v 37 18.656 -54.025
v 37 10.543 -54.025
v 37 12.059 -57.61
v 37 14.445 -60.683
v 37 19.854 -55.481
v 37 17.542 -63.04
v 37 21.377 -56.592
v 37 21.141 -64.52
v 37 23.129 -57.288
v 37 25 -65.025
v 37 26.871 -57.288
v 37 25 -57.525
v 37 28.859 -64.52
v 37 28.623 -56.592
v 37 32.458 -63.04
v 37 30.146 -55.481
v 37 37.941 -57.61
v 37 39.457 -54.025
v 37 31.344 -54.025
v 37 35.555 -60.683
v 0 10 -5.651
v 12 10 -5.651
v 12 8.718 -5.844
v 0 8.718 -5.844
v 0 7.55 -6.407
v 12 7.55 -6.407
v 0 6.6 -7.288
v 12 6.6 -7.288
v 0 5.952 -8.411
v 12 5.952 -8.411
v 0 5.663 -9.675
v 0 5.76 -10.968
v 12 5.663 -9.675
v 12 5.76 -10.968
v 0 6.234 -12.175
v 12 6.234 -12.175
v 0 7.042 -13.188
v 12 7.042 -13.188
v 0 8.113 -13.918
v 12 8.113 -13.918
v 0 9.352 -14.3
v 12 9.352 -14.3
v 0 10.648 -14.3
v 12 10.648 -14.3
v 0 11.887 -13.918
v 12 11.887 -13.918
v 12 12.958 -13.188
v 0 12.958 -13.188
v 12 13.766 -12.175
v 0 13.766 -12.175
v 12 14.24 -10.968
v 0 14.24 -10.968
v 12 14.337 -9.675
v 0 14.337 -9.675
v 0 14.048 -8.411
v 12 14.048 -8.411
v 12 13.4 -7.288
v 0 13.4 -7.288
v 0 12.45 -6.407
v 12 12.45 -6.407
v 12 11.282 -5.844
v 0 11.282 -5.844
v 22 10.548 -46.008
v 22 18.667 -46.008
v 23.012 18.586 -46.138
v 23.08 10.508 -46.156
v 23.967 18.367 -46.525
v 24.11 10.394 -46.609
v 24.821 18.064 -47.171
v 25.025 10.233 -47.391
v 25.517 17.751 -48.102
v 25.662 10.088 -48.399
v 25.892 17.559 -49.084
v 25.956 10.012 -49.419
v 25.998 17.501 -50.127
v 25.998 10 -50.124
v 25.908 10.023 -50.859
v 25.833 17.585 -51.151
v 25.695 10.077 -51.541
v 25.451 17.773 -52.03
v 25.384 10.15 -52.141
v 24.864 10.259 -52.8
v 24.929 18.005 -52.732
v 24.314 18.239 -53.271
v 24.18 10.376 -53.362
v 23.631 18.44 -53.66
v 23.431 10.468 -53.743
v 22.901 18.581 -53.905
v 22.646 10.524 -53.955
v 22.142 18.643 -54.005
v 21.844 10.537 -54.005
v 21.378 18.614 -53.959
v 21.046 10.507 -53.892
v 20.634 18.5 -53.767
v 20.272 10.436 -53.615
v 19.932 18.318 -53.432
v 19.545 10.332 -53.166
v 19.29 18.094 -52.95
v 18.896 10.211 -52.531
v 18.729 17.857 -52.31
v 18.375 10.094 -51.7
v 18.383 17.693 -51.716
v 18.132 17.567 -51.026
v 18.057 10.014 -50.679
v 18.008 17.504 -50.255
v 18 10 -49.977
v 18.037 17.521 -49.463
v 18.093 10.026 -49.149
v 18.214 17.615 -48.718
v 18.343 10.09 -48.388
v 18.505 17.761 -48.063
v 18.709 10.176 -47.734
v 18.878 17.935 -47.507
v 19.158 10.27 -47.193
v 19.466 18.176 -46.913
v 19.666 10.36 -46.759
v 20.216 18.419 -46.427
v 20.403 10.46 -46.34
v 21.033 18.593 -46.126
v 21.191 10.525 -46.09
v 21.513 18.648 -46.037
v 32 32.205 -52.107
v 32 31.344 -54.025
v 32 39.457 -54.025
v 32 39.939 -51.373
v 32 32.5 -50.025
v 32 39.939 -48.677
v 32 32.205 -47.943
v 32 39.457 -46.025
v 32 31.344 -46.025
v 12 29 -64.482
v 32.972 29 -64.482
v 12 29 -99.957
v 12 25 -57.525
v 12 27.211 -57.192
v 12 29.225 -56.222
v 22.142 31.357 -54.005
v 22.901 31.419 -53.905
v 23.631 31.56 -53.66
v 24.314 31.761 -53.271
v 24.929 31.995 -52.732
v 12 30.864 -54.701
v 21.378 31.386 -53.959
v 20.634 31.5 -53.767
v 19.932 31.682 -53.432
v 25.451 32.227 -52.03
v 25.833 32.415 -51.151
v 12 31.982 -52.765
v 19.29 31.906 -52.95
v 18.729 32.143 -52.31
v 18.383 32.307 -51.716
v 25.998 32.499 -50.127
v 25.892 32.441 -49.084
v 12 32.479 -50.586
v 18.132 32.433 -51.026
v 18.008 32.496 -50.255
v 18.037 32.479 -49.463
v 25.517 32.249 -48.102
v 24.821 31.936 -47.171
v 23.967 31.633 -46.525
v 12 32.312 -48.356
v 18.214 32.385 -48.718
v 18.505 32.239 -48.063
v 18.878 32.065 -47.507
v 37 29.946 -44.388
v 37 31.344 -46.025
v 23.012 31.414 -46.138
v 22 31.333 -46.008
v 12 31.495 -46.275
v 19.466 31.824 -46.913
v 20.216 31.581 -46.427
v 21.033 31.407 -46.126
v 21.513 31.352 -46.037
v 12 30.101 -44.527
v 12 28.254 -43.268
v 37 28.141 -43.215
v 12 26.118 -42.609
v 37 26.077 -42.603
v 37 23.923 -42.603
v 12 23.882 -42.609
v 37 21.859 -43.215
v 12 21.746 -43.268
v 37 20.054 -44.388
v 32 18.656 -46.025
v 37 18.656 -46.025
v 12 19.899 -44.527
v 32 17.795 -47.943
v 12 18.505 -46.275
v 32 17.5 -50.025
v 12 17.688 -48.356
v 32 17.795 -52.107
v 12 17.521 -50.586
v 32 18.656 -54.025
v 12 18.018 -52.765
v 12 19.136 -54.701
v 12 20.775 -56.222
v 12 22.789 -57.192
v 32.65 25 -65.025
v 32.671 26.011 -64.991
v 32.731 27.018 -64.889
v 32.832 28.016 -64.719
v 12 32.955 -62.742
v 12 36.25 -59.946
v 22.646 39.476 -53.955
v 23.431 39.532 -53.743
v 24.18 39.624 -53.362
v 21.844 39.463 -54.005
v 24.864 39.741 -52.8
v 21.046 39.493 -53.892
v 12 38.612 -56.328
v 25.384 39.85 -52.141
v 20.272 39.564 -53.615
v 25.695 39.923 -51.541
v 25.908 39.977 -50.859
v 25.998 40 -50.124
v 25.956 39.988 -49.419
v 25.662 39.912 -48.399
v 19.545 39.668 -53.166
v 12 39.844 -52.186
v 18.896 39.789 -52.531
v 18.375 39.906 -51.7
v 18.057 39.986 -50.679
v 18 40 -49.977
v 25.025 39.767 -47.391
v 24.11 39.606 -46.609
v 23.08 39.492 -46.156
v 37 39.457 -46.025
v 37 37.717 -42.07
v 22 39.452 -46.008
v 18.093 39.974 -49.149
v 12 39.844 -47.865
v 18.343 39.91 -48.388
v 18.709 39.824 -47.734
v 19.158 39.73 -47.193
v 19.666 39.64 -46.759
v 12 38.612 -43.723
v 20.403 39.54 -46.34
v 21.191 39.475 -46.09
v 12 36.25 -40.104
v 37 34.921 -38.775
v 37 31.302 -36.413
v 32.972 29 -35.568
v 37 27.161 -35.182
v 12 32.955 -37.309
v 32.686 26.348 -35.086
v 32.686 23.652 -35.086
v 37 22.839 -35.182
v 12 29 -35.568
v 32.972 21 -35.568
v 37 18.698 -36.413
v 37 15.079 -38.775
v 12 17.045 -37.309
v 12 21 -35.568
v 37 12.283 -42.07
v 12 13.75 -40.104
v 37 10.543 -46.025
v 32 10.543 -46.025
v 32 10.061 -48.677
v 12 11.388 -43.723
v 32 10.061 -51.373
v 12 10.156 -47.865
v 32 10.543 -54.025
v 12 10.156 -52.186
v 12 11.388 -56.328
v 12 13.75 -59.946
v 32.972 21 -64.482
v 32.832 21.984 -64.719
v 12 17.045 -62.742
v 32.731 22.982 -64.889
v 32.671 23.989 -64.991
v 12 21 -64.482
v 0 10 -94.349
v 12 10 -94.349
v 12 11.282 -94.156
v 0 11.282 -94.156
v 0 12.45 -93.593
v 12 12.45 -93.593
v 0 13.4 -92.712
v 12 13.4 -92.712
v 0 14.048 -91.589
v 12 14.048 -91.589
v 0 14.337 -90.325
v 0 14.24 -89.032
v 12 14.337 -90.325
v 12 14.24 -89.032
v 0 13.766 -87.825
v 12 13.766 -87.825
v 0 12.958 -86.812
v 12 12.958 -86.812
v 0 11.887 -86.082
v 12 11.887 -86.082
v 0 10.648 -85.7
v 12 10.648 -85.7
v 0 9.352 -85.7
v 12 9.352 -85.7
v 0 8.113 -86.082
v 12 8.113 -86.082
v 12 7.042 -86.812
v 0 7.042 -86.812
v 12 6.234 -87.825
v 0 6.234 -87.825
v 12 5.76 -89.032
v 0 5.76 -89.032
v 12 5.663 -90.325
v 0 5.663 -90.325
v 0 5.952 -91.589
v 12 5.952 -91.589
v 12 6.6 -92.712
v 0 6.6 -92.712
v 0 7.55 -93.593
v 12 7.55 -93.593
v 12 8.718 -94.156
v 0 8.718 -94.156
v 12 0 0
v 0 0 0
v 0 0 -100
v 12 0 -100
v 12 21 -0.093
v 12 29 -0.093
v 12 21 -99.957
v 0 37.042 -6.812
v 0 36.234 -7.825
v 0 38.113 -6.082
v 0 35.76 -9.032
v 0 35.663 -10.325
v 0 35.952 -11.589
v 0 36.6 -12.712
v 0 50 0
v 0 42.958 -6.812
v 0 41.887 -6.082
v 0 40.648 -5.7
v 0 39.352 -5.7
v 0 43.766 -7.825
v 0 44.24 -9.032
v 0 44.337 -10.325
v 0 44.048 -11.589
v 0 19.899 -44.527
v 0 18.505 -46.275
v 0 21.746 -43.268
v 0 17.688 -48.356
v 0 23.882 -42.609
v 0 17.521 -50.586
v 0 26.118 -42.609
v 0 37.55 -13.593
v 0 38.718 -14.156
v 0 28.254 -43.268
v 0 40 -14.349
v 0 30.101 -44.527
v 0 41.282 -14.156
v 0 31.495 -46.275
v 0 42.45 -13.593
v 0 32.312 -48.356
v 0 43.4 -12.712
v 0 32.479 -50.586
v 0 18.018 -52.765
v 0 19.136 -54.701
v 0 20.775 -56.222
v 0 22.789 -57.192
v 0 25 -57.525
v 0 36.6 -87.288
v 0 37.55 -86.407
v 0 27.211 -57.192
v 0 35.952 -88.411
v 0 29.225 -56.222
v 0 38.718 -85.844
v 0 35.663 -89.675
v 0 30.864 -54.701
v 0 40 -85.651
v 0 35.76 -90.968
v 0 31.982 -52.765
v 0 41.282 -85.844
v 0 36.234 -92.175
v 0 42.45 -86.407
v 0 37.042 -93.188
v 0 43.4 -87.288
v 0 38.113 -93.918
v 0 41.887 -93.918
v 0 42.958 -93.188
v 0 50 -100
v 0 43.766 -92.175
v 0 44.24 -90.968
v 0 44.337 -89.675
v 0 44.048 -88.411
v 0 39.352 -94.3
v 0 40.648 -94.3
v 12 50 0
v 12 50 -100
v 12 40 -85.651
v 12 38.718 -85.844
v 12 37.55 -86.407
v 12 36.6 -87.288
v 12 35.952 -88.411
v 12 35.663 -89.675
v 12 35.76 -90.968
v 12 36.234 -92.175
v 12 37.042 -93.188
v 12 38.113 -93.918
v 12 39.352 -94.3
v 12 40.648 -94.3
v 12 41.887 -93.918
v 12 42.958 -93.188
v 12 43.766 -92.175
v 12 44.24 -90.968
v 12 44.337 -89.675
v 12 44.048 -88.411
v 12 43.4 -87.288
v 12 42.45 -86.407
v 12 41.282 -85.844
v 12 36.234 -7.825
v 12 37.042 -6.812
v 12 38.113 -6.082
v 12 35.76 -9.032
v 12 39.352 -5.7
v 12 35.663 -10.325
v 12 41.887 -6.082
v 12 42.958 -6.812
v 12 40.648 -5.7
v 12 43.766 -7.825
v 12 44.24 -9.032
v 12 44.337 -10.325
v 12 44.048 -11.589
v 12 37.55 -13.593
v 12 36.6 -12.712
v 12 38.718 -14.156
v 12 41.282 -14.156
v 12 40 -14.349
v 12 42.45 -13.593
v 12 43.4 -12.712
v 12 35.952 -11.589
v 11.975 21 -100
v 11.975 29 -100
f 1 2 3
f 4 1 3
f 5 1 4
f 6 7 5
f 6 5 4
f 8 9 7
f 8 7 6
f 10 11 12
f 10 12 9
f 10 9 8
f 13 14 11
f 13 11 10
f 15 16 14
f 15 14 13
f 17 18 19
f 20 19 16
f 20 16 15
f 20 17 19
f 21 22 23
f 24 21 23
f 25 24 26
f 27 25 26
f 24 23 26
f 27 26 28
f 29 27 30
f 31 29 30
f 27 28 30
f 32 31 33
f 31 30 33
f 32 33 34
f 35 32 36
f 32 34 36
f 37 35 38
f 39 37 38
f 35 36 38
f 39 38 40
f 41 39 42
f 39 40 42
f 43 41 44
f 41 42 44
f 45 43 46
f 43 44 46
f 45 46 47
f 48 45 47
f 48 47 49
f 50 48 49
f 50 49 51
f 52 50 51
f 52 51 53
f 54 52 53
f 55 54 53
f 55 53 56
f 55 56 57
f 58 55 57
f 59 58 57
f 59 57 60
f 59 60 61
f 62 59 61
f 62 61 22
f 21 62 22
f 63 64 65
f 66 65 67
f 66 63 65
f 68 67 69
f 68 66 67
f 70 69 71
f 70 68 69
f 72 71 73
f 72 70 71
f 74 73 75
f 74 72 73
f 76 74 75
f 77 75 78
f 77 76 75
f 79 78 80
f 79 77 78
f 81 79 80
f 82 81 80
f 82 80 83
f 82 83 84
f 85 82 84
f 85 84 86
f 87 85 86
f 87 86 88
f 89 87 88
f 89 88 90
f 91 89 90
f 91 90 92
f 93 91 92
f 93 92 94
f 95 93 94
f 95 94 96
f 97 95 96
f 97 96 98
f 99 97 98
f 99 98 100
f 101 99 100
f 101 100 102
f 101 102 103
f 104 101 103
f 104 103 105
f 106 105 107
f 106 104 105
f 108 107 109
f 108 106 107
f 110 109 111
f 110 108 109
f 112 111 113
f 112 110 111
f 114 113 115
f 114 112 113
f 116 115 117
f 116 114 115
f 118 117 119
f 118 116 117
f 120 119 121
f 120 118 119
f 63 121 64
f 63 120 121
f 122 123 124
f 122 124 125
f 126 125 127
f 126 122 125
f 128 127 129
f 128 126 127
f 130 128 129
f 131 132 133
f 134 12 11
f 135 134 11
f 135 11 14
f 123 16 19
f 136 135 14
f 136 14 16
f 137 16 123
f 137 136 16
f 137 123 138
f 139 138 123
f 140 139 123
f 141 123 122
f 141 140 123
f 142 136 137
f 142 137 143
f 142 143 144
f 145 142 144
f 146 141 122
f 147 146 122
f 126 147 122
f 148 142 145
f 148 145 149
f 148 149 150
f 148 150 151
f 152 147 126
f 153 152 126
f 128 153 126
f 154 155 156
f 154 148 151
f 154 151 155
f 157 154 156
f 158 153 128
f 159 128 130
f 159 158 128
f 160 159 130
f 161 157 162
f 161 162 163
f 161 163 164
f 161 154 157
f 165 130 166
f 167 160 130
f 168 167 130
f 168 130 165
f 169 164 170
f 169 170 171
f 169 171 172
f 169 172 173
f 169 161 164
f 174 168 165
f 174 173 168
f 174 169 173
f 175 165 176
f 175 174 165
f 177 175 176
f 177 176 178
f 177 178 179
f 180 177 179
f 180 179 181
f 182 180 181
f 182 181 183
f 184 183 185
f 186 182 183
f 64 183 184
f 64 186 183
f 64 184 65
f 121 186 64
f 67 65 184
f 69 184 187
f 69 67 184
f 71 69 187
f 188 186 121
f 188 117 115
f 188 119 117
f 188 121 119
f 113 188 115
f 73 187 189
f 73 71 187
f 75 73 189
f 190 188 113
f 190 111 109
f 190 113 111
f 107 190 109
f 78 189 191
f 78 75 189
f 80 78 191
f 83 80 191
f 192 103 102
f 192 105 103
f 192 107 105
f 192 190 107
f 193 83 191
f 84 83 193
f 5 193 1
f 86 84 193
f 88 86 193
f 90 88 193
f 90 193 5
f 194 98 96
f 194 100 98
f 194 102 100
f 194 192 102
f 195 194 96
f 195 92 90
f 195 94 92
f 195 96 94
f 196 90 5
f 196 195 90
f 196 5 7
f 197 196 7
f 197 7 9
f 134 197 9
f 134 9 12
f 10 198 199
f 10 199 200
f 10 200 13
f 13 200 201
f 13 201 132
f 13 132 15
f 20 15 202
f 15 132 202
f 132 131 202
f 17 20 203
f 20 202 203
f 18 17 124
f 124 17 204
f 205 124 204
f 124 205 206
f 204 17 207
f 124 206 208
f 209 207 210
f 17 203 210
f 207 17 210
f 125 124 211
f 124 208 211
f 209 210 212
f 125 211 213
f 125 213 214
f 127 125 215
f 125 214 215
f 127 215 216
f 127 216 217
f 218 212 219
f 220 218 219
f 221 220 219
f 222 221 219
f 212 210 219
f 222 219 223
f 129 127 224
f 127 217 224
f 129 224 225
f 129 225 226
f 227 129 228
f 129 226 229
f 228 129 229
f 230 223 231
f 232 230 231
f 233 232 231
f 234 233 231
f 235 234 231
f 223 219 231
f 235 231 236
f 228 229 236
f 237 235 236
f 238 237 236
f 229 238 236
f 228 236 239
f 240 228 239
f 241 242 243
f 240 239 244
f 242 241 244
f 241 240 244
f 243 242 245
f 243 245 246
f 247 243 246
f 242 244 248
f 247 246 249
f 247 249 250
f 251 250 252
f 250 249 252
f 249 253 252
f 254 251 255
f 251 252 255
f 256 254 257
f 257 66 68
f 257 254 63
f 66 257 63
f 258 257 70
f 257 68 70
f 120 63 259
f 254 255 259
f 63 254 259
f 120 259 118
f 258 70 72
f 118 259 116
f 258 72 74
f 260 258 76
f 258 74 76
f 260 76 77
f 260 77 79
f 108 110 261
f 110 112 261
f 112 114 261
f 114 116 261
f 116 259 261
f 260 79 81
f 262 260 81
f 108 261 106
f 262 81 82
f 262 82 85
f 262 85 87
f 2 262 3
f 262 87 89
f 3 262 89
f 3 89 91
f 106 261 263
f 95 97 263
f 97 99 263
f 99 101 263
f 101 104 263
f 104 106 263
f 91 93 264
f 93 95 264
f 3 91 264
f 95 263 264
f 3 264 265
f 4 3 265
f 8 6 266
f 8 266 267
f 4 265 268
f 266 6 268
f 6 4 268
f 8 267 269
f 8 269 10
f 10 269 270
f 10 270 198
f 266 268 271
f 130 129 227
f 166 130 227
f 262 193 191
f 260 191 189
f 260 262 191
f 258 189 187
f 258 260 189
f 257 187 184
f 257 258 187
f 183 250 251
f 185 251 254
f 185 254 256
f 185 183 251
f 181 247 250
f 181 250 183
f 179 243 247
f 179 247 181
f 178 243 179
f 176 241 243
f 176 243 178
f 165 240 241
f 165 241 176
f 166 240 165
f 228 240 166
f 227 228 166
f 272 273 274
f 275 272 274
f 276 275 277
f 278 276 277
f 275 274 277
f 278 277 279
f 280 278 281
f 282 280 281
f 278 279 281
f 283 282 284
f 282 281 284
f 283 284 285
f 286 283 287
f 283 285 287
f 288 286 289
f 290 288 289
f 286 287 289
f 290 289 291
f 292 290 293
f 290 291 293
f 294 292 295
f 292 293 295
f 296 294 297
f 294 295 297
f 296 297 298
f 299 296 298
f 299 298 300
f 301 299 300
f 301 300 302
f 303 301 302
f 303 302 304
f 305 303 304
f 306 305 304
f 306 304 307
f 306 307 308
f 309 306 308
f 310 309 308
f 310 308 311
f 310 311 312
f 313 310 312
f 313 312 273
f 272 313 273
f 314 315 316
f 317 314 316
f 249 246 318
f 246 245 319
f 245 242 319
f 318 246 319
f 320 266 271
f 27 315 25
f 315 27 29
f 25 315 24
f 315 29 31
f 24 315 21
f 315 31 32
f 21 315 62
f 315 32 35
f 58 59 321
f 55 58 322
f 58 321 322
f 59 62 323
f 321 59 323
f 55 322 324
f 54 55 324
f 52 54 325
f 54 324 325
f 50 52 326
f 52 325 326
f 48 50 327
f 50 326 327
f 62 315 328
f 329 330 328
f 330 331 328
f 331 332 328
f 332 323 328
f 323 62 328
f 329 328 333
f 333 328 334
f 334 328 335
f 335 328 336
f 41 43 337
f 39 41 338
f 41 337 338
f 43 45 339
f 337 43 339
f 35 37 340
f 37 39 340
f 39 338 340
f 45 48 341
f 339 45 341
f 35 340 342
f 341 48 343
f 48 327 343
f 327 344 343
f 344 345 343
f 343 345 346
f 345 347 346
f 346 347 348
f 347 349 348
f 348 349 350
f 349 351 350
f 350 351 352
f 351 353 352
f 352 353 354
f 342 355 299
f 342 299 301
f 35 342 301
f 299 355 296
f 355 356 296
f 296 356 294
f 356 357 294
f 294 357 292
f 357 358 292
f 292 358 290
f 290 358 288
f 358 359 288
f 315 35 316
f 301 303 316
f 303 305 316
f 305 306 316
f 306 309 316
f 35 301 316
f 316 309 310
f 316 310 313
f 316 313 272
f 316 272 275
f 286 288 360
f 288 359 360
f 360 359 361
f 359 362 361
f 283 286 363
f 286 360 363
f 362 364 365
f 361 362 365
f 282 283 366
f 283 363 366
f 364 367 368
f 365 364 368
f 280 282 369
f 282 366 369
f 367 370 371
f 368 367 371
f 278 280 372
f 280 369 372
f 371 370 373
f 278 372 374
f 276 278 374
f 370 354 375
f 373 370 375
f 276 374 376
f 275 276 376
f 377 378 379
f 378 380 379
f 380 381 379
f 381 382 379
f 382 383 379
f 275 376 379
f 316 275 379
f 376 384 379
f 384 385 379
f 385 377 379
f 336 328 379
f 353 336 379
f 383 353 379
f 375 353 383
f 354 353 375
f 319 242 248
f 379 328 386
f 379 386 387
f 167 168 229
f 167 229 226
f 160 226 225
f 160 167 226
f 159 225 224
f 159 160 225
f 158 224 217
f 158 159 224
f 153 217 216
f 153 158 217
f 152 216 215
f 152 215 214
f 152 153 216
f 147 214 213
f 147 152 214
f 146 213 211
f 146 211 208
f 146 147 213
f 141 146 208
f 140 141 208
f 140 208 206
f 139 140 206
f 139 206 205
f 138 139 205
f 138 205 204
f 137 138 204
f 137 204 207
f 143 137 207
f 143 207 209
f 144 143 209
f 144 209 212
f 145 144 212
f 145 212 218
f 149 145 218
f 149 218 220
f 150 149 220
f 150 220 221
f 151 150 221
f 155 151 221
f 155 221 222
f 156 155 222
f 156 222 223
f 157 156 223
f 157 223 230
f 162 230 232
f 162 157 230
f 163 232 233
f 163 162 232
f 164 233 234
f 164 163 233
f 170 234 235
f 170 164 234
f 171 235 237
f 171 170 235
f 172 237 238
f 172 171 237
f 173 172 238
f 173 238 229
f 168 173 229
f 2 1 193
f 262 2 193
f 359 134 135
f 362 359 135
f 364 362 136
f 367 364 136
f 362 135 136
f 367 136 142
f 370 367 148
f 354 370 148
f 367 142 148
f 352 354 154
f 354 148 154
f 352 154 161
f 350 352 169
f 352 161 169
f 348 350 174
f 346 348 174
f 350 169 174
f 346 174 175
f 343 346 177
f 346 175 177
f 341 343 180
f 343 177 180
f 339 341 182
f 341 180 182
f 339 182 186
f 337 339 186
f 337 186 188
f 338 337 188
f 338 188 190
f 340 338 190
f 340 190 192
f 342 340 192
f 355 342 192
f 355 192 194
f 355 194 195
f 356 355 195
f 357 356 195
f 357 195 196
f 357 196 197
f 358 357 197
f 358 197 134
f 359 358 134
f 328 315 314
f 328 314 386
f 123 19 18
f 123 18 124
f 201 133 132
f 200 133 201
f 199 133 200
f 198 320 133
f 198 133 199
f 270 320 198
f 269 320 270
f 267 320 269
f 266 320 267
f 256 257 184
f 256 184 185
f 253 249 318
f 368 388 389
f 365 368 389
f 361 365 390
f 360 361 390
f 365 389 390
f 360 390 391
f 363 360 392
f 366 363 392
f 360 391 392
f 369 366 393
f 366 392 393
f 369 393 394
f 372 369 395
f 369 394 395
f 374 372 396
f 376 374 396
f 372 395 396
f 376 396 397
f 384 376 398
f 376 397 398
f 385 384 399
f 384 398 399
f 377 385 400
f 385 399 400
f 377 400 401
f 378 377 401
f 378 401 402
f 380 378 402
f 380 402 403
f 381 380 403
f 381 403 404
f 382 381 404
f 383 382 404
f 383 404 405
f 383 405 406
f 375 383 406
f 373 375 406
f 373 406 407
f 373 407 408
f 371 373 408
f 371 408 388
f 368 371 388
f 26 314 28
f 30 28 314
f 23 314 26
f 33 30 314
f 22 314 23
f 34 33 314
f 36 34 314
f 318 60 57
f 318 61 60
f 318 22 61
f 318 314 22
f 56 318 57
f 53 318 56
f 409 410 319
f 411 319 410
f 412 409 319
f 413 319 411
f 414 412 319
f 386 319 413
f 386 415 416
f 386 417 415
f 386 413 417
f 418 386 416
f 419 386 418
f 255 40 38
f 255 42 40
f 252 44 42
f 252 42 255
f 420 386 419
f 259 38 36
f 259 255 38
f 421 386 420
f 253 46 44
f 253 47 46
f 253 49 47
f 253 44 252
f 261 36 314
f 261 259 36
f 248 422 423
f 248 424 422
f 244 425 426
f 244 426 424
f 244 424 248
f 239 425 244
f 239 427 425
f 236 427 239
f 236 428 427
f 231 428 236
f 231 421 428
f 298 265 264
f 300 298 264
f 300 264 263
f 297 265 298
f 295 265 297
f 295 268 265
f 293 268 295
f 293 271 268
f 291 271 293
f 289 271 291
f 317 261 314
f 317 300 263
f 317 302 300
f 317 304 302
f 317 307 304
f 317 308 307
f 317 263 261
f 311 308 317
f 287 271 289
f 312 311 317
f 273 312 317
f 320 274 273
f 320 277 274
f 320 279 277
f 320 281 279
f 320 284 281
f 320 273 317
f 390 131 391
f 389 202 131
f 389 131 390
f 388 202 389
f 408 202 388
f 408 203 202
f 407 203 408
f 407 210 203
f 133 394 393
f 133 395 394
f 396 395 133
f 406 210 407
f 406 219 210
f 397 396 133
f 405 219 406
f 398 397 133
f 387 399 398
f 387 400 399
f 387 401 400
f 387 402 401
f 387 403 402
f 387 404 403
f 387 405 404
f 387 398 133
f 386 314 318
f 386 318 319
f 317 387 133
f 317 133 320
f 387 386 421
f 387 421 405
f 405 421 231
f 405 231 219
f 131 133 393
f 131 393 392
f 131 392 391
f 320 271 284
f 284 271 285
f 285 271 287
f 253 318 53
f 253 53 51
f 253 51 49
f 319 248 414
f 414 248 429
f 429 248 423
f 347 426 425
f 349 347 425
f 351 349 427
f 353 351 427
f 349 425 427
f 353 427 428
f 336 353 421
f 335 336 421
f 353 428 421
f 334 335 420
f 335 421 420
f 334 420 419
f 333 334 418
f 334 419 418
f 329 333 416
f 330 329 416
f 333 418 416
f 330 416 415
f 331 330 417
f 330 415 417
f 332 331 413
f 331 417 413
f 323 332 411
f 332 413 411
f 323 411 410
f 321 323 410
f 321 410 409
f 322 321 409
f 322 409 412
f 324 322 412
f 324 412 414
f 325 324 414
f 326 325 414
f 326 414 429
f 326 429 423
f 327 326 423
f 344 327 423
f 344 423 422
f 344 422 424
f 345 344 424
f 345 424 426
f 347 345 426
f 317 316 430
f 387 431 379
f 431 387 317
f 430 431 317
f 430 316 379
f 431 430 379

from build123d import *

# Parameters (mm, degrees)
SKETCH_1_W               = 100
SKETCH_1_H               = 50
EXTRUDE_1_DEPTH          = 12
SKETCH_2_R               = 15
SKETCH_2_R_2             = 7.5
EXTRUDE_3_DEPTH          = 25
EXTRUDE_20_DEPTH         = 4
SKETCH_7_R               = 7.5
CUT_EXTRUDE_2_DEPTH      = 115.564392374
CUT_EXTRUDE_4_DEPTH      = 110.517121949
CUT_EXTRUDE_4_DEPTH_BACK = 110.517121949
CUT_EXTRUDE_5_DEPTH      = 110.517121949
CUT_EXTRUDE_5_DEPTH_BACK = 110.517121949
SKETCH_9_R               = 4
SKETCH_10_R              = 4.349058231
CUT_EXTRUDE_6_DEPTH      = 115.564392396


with BuildPart() as part:
    # 草图1 → 凸台-拉伸1 (new body)
    with BuildSketch(Plane(origin=(0, 0, 0), x_dir=(0, 0, -1), z_dir=(1, 0, 0))):
        with Locations((50, 25)):
            Rectangle(SKETCH_1_W, SKETCH_1_H)
    extrude(amount=EXTRUDE_1_DEPTH)

    # 草图2 → 凸台-拉伸3 (add)
    with BuildSketch(Plane(origin=(12, 0, 0), x_dir=(0, 0, -1), z_dir=(1, 0, 0))):
        with Locations((50.025247728, 25)):
            Circle(SKETCH_2_R)
        with Locations((50.025247728, 25)):
            Circle(SKETCH_2_R_2, mode=Mode.SUBTRACT)
    extrude(amount=EXTRUDE_3_DEPTH)

    # 草图6 → 凸台-拉伸20 (add, symmetric)
    with BuildSketch(Plane(origin=(0, 25, 0), x_dir=(1, 0, 0), z_dir=(0, 1, 0))):
        Polygon((11.607924721, 61.899802302), (11.974710876, 100), (34.498075292, 61.899802302), align=None)
        Polygon((11.607924721, 38.150693154), (34.498075292, 38.150693154), (11.974710876, 0.050495456), align=None)
    extrude(amount=EXTRUDE_20_DEPTH, both=True)

    # 草图7 → 切除-拉伸2 (cut, through all)
    with BuildSketch(Plane(origin=(12, 0, 0), x_dir=(0, 0, -1), z_dir=(1, 0, 0))):
        with Locations((50.025247728, 25)):
            Circle(SKETCH_7_R)
    extrude(amount=-CUT_EXTRUDE_2_DEPTH, mode=Mode.SUBTRACT)

    # 草图8 → 切除-拉伸4 (cut, two sides: drawn at the far end of the back side and taken through both)
    with BuildSketch(Plane(origin=(0, 25, 0), x_dir=(1, 0, 0), z_dir=(0, 1, 0)).offset(-CUT_EXTRUDE_4_DEPTH_BACK)):
        Polygon((37, 54.025247728), (32, 54.025247728), (32, 46.025247728), (37, 46.025247728), (37, 50.025247728), align=None)
    extrude(amount=CUT_EXTRUDE_4_DEPTH + CUT_EXTRUDE_4_DEPTH_BACK, mode=Mode.SUBTRACT)

    # 草图9 → 切除-拉伸5 (cut, two sides: drawn at the far end of the back side and taken through both)
    with BuildSketch(Plane(origin=(0, 25, 0), x_dir=(1, 0, 0), z_dir=(0, 1, 0)).offset(-CUT_EXTRUDE_5_DEPTH_BACK)):
        with Locations(Location((22, 50.007690545, 0), (0, 0, 270))):
            Circle(SKETCH_9_R)
    extrude(amount=CUT_EXTRUDE_5_DEPTH + CUT_EXTRUDE_5_DEPTH_BACK, mode=Mode.SUBTRACT)

    # 草图10 → 切除-拉伸6 (cut, through all)
    with BuildSketch(Plane(origin=(12, 0, 0), x_dir=(0, 0, -1), z_dir=(1, 0, 0))):
        with Locations((10, 40)):
            Circle(SKETCH_10_R)
        with Locations(Location((10, 10, 0), (0, 0, 180))):
            Circle(SKETCH_10_R)
        with Locations((90, 10)):
            Circle(SKETCH_10_R)
        with Locations(Location((90, 40, 0), (0, 0, 180))):
            Circle(SKETCH_10_R)
    extrude(amount=-CUT_EXTRUDE_6_DEPTH, mode=Mode.SUBTRACT)


solid = part.part
